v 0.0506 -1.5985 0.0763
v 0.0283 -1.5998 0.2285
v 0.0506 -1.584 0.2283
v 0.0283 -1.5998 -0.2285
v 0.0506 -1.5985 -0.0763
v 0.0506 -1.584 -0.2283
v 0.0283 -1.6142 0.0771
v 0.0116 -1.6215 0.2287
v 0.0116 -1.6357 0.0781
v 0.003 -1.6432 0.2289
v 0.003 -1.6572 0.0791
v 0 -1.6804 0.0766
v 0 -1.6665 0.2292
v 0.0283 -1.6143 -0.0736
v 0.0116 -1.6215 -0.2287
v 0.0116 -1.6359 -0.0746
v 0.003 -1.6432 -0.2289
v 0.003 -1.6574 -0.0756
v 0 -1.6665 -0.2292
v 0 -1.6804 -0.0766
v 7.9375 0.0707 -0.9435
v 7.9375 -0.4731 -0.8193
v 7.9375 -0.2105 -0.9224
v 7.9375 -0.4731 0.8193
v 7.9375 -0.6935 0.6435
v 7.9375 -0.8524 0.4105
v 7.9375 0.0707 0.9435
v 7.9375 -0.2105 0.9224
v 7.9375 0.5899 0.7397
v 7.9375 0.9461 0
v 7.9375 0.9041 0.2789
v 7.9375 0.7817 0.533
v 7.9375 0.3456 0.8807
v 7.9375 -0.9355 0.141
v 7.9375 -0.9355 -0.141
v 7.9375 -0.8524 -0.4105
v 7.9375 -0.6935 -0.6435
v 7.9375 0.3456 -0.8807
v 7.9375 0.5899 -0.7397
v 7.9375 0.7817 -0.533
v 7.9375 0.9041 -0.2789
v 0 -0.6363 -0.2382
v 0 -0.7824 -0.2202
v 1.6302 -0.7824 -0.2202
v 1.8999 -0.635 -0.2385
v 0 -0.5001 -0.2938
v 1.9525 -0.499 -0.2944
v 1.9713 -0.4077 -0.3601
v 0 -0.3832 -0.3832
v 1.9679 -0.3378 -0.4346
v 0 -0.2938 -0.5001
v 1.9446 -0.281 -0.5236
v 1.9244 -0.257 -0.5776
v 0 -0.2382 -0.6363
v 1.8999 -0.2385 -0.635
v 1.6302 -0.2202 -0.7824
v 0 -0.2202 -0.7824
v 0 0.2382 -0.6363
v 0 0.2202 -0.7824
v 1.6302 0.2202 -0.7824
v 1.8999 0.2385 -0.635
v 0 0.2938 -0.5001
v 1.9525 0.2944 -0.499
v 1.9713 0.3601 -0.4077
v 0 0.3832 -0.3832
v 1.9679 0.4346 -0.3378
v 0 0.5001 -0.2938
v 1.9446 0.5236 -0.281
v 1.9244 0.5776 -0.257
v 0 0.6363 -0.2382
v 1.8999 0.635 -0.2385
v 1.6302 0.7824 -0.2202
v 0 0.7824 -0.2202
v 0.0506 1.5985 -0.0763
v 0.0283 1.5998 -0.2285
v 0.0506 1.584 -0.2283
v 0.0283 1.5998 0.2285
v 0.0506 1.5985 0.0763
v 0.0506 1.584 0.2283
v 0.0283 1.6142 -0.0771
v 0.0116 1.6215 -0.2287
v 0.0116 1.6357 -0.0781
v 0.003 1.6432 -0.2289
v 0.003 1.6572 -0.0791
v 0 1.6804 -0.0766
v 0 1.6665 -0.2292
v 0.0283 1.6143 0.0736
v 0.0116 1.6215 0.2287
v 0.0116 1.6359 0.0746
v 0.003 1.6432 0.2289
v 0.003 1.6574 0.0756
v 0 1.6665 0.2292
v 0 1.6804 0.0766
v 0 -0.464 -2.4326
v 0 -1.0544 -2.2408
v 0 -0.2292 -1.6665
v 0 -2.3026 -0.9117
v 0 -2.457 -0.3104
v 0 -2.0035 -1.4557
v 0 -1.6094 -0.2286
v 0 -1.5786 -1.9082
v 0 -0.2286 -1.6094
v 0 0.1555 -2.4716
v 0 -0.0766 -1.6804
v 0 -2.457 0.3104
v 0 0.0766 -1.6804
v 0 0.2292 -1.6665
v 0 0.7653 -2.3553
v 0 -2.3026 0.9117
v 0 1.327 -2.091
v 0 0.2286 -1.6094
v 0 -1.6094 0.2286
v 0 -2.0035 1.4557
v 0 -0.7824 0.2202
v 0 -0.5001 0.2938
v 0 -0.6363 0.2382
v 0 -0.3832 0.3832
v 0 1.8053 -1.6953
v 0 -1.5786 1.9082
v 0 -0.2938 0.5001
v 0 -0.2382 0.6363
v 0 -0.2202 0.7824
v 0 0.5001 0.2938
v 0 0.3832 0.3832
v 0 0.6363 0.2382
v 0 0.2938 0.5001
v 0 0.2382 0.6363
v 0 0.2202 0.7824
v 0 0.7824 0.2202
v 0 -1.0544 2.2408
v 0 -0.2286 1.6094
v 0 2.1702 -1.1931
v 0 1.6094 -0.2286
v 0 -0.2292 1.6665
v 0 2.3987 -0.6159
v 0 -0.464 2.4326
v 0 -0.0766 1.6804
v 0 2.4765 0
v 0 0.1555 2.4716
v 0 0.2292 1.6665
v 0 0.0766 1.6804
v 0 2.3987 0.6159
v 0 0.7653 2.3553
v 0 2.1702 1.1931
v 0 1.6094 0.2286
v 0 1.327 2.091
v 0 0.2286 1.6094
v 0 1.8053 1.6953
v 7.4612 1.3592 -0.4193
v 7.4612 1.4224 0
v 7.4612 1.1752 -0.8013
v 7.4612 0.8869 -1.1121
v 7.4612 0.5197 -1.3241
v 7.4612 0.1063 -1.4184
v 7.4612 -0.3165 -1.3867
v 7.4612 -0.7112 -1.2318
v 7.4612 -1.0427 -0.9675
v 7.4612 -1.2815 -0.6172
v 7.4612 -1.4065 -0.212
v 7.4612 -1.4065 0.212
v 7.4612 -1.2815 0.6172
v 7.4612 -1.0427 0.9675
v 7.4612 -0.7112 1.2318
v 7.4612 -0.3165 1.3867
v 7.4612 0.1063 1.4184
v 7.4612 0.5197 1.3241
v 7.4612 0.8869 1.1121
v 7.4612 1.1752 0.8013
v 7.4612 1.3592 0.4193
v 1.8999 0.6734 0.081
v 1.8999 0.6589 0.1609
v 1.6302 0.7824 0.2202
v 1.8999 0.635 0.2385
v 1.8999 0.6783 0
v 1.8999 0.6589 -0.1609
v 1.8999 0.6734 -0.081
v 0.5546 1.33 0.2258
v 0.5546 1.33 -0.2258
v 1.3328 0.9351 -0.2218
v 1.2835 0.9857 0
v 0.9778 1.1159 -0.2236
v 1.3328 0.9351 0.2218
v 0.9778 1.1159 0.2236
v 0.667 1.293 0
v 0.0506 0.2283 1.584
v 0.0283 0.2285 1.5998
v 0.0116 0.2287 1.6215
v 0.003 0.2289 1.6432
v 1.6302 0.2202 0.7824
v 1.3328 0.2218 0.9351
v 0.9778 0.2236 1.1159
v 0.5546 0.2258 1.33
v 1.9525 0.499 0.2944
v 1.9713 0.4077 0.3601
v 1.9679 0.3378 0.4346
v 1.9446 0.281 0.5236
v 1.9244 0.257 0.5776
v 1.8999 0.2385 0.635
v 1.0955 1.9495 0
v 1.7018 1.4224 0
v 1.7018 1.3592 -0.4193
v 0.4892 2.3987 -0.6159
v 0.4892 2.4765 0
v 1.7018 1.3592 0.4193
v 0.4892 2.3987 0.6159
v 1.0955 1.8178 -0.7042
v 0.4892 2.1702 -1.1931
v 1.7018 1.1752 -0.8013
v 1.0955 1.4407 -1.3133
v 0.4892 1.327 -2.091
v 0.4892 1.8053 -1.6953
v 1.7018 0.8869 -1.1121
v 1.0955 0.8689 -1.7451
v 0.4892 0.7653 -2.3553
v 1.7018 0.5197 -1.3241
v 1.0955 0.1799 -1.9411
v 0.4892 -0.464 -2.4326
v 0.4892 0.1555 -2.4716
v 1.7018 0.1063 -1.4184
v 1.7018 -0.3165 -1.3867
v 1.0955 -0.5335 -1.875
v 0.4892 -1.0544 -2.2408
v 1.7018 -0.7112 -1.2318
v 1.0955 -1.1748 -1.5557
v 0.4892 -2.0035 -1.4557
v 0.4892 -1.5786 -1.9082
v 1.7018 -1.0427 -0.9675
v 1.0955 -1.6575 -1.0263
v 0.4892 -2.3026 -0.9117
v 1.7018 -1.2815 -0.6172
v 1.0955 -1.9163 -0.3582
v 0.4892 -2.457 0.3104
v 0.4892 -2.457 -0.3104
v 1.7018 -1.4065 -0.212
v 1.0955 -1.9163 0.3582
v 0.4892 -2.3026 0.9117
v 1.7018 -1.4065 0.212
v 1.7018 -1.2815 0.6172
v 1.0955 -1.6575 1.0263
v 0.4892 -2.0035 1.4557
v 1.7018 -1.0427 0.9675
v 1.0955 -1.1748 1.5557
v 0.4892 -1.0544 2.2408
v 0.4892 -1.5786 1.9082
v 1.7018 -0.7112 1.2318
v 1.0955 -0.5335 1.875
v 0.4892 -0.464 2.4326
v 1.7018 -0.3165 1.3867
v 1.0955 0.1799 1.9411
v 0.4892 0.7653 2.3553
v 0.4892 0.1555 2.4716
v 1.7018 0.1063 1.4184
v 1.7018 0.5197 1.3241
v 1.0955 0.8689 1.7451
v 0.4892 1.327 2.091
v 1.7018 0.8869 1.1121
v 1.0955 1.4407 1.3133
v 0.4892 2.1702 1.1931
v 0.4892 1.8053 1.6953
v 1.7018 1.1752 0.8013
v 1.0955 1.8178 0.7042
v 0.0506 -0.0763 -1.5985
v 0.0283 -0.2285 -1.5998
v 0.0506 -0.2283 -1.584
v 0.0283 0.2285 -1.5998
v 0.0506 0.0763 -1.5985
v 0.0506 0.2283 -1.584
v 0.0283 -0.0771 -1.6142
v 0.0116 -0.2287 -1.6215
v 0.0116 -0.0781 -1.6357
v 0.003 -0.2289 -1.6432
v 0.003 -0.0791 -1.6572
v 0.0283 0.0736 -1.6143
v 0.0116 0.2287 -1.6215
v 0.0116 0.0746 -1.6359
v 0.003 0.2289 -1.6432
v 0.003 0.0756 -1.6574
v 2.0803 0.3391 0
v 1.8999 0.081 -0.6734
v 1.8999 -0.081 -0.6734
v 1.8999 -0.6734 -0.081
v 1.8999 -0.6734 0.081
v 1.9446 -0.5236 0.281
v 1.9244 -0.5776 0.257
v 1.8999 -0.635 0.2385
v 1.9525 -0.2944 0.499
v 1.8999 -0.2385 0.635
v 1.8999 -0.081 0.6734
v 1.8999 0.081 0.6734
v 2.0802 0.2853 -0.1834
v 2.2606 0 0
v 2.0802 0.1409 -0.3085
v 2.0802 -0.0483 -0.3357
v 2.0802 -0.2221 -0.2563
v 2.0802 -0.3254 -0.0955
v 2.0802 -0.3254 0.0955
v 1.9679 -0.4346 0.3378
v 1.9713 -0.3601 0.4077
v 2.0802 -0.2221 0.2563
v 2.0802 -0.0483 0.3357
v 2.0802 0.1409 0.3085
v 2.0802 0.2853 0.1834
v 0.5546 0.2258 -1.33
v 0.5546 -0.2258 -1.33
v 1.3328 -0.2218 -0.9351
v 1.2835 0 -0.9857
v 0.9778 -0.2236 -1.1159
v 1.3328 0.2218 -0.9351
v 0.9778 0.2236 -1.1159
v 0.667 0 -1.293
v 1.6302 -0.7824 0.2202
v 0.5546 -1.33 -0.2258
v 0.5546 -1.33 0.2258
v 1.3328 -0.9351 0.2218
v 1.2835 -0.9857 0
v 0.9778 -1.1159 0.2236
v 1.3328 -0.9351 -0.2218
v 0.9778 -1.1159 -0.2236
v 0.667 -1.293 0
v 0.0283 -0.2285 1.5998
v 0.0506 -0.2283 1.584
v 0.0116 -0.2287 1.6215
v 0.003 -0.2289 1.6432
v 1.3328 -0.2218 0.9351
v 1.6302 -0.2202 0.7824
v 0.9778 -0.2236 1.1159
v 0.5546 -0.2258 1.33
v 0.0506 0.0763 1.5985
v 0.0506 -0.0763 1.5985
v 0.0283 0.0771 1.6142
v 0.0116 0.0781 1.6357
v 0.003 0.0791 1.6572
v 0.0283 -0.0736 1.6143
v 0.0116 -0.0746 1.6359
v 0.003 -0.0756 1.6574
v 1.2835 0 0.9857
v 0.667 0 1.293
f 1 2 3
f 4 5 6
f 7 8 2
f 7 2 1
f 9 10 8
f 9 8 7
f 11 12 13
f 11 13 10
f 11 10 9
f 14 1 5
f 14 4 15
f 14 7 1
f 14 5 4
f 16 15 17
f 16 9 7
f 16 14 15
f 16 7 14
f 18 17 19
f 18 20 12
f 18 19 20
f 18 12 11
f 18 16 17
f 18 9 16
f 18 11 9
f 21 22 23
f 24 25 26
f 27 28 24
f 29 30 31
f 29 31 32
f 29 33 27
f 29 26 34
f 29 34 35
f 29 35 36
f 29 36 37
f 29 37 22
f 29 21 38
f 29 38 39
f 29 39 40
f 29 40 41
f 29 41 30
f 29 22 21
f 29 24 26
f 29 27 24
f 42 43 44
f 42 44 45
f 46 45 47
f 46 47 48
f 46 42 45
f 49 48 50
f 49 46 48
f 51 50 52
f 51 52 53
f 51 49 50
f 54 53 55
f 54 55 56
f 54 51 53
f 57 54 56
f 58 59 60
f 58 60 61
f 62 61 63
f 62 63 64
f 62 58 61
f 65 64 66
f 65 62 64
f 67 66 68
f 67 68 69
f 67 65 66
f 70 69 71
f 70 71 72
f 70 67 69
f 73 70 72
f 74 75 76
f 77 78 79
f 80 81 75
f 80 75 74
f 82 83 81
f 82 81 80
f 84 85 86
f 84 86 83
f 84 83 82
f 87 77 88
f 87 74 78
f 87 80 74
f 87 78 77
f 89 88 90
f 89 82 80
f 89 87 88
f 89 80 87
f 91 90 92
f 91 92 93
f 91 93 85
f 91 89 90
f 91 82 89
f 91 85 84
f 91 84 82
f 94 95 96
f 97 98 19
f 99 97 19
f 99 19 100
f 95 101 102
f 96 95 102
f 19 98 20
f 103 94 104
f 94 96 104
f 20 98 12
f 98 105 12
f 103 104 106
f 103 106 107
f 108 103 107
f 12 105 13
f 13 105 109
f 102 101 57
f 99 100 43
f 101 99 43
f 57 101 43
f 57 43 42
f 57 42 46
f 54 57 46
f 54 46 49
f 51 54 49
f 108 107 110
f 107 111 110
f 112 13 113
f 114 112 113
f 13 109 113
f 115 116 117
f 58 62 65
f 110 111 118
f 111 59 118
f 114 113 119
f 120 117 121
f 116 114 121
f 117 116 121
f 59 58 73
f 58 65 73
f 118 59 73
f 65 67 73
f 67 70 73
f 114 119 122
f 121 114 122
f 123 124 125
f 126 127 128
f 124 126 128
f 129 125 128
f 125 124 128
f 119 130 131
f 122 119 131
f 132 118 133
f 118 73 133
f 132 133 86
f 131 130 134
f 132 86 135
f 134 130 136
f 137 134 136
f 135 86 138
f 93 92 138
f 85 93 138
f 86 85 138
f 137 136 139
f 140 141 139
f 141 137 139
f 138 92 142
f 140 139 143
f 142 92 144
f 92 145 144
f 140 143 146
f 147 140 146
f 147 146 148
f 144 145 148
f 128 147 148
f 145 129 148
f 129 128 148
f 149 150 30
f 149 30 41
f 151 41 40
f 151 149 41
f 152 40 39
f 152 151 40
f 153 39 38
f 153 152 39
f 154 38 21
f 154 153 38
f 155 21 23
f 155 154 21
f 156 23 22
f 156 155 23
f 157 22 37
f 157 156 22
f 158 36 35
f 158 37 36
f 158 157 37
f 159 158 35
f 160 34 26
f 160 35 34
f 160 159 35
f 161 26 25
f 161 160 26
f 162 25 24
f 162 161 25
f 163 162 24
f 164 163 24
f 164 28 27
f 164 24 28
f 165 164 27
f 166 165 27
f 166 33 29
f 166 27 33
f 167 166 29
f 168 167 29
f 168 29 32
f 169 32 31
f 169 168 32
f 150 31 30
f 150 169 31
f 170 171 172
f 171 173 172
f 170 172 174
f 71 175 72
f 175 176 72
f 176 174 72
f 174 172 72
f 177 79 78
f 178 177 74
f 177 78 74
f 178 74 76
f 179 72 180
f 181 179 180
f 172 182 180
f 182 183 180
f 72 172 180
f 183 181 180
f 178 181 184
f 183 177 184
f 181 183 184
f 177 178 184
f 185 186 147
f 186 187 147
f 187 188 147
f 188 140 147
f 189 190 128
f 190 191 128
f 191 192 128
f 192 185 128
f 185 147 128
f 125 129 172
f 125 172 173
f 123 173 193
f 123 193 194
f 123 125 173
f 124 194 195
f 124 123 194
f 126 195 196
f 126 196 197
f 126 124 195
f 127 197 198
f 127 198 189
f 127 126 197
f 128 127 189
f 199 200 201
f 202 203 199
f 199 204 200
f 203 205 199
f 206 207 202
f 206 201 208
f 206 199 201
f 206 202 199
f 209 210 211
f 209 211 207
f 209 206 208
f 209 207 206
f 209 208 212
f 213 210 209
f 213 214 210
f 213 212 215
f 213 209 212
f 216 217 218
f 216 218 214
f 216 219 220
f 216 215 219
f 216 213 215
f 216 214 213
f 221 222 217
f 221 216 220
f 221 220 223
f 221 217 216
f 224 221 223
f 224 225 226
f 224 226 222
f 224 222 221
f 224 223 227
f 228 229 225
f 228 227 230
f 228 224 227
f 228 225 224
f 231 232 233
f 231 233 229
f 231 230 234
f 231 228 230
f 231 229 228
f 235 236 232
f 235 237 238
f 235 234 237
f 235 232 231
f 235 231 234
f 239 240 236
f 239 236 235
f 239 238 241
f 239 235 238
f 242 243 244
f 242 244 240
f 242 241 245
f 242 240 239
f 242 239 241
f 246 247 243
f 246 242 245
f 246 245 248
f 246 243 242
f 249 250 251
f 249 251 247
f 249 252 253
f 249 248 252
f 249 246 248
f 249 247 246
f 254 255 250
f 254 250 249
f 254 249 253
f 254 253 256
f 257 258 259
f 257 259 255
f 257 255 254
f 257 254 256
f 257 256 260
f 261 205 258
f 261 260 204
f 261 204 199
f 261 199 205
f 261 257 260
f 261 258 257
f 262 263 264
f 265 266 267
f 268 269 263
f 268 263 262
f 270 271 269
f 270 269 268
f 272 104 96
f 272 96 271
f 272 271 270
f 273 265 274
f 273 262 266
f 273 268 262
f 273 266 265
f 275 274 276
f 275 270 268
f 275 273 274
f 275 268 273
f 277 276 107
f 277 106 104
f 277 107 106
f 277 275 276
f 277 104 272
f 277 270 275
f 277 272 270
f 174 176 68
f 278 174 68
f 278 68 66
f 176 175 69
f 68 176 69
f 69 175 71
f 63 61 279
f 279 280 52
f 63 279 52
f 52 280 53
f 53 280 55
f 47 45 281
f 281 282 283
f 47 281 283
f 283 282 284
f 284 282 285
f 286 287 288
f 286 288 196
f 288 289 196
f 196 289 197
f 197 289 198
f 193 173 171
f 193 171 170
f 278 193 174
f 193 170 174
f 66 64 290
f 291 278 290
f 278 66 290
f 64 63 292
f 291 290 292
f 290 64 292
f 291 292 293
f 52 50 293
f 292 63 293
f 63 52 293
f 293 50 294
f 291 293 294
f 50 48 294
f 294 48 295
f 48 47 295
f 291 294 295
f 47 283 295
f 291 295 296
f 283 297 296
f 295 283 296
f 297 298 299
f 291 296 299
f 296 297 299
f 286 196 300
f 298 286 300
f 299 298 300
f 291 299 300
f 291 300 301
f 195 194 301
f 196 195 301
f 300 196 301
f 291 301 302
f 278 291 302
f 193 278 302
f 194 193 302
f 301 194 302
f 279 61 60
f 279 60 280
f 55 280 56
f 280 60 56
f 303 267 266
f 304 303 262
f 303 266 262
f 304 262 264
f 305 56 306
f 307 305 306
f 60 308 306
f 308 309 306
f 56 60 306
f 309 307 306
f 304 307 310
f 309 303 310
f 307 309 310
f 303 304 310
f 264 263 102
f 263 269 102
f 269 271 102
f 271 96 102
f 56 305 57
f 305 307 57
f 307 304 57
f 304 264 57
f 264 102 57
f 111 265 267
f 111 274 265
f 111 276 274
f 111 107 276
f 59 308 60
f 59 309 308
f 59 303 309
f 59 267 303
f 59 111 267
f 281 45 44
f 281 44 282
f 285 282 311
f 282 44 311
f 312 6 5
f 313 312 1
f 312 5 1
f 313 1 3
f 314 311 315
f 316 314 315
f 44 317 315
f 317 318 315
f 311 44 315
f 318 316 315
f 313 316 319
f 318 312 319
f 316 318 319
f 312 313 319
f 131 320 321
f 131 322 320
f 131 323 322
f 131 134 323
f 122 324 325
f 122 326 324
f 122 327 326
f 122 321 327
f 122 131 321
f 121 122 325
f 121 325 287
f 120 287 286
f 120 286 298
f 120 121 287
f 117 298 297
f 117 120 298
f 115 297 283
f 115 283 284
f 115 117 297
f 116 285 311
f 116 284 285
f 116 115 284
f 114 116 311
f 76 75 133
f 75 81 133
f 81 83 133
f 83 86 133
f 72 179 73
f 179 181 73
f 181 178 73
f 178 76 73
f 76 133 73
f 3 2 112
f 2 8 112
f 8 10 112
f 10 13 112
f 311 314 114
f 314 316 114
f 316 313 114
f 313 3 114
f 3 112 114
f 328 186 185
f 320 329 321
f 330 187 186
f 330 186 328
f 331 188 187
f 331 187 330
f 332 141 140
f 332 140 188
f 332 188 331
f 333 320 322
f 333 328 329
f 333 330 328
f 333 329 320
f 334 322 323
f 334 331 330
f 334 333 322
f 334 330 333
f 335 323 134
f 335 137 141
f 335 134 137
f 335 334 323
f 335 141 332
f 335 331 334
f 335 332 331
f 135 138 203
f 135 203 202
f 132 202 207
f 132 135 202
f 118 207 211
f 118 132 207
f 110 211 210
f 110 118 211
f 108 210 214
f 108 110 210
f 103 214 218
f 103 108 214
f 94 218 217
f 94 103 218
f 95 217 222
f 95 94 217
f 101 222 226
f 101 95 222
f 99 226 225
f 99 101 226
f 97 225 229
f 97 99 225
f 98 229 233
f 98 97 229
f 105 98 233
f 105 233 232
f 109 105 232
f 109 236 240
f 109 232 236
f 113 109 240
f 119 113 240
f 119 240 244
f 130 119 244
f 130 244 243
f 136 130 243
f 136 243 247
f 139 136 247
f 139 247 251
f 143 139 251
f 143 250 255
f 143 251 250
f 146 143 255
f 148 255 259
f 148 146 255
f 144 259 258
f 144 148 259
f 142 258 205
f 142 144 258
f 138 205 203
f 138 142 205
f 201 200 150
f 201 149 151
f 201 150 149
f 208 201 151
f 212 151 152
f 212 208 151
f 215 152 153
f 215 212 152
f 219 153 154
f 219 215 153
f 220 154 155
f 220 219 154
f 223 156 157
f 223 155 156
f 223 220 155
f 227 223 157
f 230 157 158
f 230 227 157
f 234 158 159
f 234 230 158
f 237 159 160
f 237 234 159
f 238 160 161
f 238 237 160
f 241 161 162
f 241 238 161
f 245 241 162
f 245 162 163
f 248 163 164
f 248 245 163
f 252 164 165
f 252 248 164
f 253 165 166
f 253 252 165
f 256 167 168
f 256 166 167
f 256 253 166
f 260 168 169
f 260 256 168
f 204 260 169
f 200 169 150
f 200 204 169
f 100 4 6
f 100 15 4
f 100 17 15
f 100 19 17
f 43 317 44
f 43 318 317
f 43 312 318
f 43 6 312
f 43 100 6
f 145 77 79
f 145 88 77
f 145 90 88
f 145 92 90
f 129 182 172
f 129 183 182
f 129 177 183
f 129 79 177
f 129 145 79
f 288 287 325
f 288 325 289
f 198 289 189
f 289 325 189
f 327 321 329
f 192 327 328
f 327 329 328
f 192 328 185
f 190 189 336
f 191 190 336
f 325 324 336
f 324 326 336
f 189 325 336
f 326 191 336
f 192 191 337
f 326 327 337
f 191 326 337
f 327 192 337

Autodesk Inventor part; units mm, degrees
ref_plane "YZ Plane" through (0, 0, 0) normal (1, 0, 0) x (0, 1, 0)
ref_plane "XZ Plane" through (0, 0, 0) normal (0, 1, 0) x (-1, 0, 0)
sketch "Sketch1" plane through (0, 0, 0) normal (0, 0, 1) x (1, 0, 0)
  line L0 (2.2606, 0) -> (7.9375, 0)
  line L1 (7.9375, 0) -> (7.9375, 1.4224)
  line L2 (7.9375, 1.4224) -> (1.7018, 1.4224)
  line L3 (0.4892, 2.4765) -> (0, 2.4765)
  line L4 (-1.5875, 0) -> (9.525, 0) projected
  line L5 (0, -0.4953) -> (0, 2.9718) projected
  line L6 (0, 1.6256) -> (1.8999, 0.6783)
  line L7 (1.8999, 0.6783) -> (2.2606, 0)
  line L8 (1.7018, 1.4224) -> (0.4892, 2.4765)
  line L9 (0, 2.4765) -> (0, 1.6256)
  dimension "d2" = 2.8448
  dimension "d3" = 4.953
  dimension "d4" = 2.2606
  dimension "d5" = 3.2512
  dimension "d6" = 26.5
  dimension "d7" = 62
  dimension "d13" = 41
  dimension "d14" = 1.7018
  dimension "d15" = 7.9375
revolve "Body" add sketch "Sketch1" angle 360 about axis through (2.2606, 0, 0) along (1, 0, 0) contours L7 L6 L5 L3 L8 L2 L1 L0
sketch "Sketch2" plane through (0, 0, 0) normal (-1, 0, 0) x (0, 0, 1)
  line L0 (0, -3.4671) -> (0, 3.4671) projected
  line L1 (-3.4671, 0) -> (3.4671, 0) projected
  line L2 (0, 1.6256) -> (0, 0) construction
  line L3 (0, 0) -> (1.6256, 0) construction
  arc A0 (0.5419, 0) -> (0, 0.5419) centre (0, 0) ccw
  line L4 (0, 0) -> (0.7947, 0.7947) construction
  arc A1 (0.8128, 0) -> (0, 0.8128) centre (0, 0) ccw construction
  line L5 (0.2286, 1.6094) -> (0.2202, 0.7824)
  line L6 (1.6094, 0.2286) -> (0.7824, 0.2202)
  arc A2 (0.2202, 0.7824) -> (0.7824, 0.2202) centre (0.7767, 0.7767) ccw
  arc A3 (1.6256, 0) -> (1.6094, 0.2286) centre (0, 0) ccw
  arc A4 (0.2286, 1.6094) -> (0, 1.6256) centre (0, 0) ccw
  arc A5 (1.6094, 0.2286) -> (0.2286, 1.6094) centre (0, 0) ccw
  line L7 (0.2286, -1.6094) -> (0.2202, -0.7824)
  line L8 (1.6094, -0.2286) -> (0.7824, -0.2202)
  arc A6 (0.7824, -0.2202) -> (0.2202, -0.7824) centre (0.7767, -0.7767) ccw
  arc A7 (1.6094, -0.2286) -> (1.6256, 0) centre (0, 0) ccw
  arc A8 (0, -1.6256) -> (0.2286, -1.6094) centre (0, 0) ccw
  arc A9 (0.2286, -1.6094) -> (1.6094, -0.2286) centre (0, 0) ccw
  line L9 (-0.2286, 1.6094) -> (-0.2202, 0.7824)
  line L10 (-1.6094, 0.2286) -> (-0.7824, 0.2202)
  arc A10 (-0.7824, 0.2202) -> (-0.2202, 0.7824) centre (-0.7767, 0.7767) ccw
  arc A11 (-1.6094, 0.2286) -> (-1.6256, 0) centre (0, 0) ccw
  arc A12 (0, 1.6256) -> (-0.2286, 1.6094) centre (0, 0) ccw
  arc A13 (-0.2286, 1.6094) -> (-1.6094, 0.2286) centre (0, 0) ccw
  arc A14 (-1.6094, -0.2286) -> (-0.2286, -1.6094) centre (0, 0) ccw
  arc A15 (-0.2286, -1.6094) -> (0, -1.6256) centre (0, 0) ccw
  arc A16 (-1.6256, 0) -> (-1.6094, -0.2286) centre (0, 0) ccw
  line L11 (-1.6094, -0.2286) -> (-0.7824, -0.2202)
  arc A17 (-0.2202, -0.7824) -> (-0.7824, -0.2202) centre (-0.7767, -0.7767) ccw
  line L12 (-0.2286, -1.6094) -> (-0.2202, -0.7824)
  dimension "d18" = 45
  dimension "d19" = 1.0837
  dimension "d20" = 1.6256
  dimension "d21" = 3.2512
  dimension "d22" = 0.2286
extrude "Slot" add sketch "Sketch2" against normal up to next contours A2 L5 A5 L6 | L9 A10 L10 A13 | L7 A6 L8 A9 | A14 L11 A17 L12
fillet "Fillet1" radius 0.0914 4 edges at (0, 1.6256, 0) (0, 0, 1.6256) (0, -1.6256, 0) (0, 0, -1.6256)
thread "Thread" size "4-40 UNC" class "2A" standard "ANSI Unified Screw Threads" length 4.6482
chamfer "Chamfer1" distance 0.4763 distance2 0.4763 1 edges at (7.9375, -1.4224, 0) measured on face at (7.9375, -0.0186, 0.3144)
ref_plane "Work Plane2" through (2.032, 0, 0) normal (0, 1, 0) x (1, 0, 0)
equation "\"d2\" = GD"
equation "\"d3\" = KOD"
equation "\"d4\" = INTI"
equation "\"d5\" = SDM"
equation "\"d13\" = 0.5 * SEWI"
equation "\"d14\" = KOH"
equation "\"d15\" = NLG"
equation "\"d19\" = 0.333333 * SDM"
equation "\"d20\" = 0.5 * SDM"
equation "\"d21\" = SDM"
equation "\"d22\" = 0.5 * SBR"
equation "\"d45\" = INTI"
equation "\"d25\" = 0.2 * SBR"
equation "\"d9\" = GEL"
equation "\"d11\" = -0.5 * SPD + 0.5 * GD"
equation "\"d12\" = GUL"
equation "\"GD\" = NND"
equation "\"NLG\" = 7.9375"
equation "\"GEL\" = 4.6482"
equation "\"KOD\" = 4.953"
equation "\"KOH\" = 1.7018"
equation "\"SDM\" = 3.2512"
equation "\"INTI\" = 2.2606"
equation "\"SBR\" = 0.4572"
equation "\"GUL\" = 0.75 * GAL"
equation "\"SPD\" = 1.8923"
equation "\"SEWI\" = 82deg"
equation "\"d0\" = NLG"
equation "\"d1\" = KOH"
equation "\"d17\" = SDM"
equation "\"TOA\" = 30deg"
equation "\"THREADDIA\" = 2.8448"
equation "\"BDM\" = NND"
equation "\"NND\" = 2.8448"
equation "\"GAL\" = 0.635"
equation "\"GD1\" = SPD"
properties part number "ANSI B18.6.3 - 4-40 x 5/16, CRFCHMSTII(5)" material "Steel, Mild"
